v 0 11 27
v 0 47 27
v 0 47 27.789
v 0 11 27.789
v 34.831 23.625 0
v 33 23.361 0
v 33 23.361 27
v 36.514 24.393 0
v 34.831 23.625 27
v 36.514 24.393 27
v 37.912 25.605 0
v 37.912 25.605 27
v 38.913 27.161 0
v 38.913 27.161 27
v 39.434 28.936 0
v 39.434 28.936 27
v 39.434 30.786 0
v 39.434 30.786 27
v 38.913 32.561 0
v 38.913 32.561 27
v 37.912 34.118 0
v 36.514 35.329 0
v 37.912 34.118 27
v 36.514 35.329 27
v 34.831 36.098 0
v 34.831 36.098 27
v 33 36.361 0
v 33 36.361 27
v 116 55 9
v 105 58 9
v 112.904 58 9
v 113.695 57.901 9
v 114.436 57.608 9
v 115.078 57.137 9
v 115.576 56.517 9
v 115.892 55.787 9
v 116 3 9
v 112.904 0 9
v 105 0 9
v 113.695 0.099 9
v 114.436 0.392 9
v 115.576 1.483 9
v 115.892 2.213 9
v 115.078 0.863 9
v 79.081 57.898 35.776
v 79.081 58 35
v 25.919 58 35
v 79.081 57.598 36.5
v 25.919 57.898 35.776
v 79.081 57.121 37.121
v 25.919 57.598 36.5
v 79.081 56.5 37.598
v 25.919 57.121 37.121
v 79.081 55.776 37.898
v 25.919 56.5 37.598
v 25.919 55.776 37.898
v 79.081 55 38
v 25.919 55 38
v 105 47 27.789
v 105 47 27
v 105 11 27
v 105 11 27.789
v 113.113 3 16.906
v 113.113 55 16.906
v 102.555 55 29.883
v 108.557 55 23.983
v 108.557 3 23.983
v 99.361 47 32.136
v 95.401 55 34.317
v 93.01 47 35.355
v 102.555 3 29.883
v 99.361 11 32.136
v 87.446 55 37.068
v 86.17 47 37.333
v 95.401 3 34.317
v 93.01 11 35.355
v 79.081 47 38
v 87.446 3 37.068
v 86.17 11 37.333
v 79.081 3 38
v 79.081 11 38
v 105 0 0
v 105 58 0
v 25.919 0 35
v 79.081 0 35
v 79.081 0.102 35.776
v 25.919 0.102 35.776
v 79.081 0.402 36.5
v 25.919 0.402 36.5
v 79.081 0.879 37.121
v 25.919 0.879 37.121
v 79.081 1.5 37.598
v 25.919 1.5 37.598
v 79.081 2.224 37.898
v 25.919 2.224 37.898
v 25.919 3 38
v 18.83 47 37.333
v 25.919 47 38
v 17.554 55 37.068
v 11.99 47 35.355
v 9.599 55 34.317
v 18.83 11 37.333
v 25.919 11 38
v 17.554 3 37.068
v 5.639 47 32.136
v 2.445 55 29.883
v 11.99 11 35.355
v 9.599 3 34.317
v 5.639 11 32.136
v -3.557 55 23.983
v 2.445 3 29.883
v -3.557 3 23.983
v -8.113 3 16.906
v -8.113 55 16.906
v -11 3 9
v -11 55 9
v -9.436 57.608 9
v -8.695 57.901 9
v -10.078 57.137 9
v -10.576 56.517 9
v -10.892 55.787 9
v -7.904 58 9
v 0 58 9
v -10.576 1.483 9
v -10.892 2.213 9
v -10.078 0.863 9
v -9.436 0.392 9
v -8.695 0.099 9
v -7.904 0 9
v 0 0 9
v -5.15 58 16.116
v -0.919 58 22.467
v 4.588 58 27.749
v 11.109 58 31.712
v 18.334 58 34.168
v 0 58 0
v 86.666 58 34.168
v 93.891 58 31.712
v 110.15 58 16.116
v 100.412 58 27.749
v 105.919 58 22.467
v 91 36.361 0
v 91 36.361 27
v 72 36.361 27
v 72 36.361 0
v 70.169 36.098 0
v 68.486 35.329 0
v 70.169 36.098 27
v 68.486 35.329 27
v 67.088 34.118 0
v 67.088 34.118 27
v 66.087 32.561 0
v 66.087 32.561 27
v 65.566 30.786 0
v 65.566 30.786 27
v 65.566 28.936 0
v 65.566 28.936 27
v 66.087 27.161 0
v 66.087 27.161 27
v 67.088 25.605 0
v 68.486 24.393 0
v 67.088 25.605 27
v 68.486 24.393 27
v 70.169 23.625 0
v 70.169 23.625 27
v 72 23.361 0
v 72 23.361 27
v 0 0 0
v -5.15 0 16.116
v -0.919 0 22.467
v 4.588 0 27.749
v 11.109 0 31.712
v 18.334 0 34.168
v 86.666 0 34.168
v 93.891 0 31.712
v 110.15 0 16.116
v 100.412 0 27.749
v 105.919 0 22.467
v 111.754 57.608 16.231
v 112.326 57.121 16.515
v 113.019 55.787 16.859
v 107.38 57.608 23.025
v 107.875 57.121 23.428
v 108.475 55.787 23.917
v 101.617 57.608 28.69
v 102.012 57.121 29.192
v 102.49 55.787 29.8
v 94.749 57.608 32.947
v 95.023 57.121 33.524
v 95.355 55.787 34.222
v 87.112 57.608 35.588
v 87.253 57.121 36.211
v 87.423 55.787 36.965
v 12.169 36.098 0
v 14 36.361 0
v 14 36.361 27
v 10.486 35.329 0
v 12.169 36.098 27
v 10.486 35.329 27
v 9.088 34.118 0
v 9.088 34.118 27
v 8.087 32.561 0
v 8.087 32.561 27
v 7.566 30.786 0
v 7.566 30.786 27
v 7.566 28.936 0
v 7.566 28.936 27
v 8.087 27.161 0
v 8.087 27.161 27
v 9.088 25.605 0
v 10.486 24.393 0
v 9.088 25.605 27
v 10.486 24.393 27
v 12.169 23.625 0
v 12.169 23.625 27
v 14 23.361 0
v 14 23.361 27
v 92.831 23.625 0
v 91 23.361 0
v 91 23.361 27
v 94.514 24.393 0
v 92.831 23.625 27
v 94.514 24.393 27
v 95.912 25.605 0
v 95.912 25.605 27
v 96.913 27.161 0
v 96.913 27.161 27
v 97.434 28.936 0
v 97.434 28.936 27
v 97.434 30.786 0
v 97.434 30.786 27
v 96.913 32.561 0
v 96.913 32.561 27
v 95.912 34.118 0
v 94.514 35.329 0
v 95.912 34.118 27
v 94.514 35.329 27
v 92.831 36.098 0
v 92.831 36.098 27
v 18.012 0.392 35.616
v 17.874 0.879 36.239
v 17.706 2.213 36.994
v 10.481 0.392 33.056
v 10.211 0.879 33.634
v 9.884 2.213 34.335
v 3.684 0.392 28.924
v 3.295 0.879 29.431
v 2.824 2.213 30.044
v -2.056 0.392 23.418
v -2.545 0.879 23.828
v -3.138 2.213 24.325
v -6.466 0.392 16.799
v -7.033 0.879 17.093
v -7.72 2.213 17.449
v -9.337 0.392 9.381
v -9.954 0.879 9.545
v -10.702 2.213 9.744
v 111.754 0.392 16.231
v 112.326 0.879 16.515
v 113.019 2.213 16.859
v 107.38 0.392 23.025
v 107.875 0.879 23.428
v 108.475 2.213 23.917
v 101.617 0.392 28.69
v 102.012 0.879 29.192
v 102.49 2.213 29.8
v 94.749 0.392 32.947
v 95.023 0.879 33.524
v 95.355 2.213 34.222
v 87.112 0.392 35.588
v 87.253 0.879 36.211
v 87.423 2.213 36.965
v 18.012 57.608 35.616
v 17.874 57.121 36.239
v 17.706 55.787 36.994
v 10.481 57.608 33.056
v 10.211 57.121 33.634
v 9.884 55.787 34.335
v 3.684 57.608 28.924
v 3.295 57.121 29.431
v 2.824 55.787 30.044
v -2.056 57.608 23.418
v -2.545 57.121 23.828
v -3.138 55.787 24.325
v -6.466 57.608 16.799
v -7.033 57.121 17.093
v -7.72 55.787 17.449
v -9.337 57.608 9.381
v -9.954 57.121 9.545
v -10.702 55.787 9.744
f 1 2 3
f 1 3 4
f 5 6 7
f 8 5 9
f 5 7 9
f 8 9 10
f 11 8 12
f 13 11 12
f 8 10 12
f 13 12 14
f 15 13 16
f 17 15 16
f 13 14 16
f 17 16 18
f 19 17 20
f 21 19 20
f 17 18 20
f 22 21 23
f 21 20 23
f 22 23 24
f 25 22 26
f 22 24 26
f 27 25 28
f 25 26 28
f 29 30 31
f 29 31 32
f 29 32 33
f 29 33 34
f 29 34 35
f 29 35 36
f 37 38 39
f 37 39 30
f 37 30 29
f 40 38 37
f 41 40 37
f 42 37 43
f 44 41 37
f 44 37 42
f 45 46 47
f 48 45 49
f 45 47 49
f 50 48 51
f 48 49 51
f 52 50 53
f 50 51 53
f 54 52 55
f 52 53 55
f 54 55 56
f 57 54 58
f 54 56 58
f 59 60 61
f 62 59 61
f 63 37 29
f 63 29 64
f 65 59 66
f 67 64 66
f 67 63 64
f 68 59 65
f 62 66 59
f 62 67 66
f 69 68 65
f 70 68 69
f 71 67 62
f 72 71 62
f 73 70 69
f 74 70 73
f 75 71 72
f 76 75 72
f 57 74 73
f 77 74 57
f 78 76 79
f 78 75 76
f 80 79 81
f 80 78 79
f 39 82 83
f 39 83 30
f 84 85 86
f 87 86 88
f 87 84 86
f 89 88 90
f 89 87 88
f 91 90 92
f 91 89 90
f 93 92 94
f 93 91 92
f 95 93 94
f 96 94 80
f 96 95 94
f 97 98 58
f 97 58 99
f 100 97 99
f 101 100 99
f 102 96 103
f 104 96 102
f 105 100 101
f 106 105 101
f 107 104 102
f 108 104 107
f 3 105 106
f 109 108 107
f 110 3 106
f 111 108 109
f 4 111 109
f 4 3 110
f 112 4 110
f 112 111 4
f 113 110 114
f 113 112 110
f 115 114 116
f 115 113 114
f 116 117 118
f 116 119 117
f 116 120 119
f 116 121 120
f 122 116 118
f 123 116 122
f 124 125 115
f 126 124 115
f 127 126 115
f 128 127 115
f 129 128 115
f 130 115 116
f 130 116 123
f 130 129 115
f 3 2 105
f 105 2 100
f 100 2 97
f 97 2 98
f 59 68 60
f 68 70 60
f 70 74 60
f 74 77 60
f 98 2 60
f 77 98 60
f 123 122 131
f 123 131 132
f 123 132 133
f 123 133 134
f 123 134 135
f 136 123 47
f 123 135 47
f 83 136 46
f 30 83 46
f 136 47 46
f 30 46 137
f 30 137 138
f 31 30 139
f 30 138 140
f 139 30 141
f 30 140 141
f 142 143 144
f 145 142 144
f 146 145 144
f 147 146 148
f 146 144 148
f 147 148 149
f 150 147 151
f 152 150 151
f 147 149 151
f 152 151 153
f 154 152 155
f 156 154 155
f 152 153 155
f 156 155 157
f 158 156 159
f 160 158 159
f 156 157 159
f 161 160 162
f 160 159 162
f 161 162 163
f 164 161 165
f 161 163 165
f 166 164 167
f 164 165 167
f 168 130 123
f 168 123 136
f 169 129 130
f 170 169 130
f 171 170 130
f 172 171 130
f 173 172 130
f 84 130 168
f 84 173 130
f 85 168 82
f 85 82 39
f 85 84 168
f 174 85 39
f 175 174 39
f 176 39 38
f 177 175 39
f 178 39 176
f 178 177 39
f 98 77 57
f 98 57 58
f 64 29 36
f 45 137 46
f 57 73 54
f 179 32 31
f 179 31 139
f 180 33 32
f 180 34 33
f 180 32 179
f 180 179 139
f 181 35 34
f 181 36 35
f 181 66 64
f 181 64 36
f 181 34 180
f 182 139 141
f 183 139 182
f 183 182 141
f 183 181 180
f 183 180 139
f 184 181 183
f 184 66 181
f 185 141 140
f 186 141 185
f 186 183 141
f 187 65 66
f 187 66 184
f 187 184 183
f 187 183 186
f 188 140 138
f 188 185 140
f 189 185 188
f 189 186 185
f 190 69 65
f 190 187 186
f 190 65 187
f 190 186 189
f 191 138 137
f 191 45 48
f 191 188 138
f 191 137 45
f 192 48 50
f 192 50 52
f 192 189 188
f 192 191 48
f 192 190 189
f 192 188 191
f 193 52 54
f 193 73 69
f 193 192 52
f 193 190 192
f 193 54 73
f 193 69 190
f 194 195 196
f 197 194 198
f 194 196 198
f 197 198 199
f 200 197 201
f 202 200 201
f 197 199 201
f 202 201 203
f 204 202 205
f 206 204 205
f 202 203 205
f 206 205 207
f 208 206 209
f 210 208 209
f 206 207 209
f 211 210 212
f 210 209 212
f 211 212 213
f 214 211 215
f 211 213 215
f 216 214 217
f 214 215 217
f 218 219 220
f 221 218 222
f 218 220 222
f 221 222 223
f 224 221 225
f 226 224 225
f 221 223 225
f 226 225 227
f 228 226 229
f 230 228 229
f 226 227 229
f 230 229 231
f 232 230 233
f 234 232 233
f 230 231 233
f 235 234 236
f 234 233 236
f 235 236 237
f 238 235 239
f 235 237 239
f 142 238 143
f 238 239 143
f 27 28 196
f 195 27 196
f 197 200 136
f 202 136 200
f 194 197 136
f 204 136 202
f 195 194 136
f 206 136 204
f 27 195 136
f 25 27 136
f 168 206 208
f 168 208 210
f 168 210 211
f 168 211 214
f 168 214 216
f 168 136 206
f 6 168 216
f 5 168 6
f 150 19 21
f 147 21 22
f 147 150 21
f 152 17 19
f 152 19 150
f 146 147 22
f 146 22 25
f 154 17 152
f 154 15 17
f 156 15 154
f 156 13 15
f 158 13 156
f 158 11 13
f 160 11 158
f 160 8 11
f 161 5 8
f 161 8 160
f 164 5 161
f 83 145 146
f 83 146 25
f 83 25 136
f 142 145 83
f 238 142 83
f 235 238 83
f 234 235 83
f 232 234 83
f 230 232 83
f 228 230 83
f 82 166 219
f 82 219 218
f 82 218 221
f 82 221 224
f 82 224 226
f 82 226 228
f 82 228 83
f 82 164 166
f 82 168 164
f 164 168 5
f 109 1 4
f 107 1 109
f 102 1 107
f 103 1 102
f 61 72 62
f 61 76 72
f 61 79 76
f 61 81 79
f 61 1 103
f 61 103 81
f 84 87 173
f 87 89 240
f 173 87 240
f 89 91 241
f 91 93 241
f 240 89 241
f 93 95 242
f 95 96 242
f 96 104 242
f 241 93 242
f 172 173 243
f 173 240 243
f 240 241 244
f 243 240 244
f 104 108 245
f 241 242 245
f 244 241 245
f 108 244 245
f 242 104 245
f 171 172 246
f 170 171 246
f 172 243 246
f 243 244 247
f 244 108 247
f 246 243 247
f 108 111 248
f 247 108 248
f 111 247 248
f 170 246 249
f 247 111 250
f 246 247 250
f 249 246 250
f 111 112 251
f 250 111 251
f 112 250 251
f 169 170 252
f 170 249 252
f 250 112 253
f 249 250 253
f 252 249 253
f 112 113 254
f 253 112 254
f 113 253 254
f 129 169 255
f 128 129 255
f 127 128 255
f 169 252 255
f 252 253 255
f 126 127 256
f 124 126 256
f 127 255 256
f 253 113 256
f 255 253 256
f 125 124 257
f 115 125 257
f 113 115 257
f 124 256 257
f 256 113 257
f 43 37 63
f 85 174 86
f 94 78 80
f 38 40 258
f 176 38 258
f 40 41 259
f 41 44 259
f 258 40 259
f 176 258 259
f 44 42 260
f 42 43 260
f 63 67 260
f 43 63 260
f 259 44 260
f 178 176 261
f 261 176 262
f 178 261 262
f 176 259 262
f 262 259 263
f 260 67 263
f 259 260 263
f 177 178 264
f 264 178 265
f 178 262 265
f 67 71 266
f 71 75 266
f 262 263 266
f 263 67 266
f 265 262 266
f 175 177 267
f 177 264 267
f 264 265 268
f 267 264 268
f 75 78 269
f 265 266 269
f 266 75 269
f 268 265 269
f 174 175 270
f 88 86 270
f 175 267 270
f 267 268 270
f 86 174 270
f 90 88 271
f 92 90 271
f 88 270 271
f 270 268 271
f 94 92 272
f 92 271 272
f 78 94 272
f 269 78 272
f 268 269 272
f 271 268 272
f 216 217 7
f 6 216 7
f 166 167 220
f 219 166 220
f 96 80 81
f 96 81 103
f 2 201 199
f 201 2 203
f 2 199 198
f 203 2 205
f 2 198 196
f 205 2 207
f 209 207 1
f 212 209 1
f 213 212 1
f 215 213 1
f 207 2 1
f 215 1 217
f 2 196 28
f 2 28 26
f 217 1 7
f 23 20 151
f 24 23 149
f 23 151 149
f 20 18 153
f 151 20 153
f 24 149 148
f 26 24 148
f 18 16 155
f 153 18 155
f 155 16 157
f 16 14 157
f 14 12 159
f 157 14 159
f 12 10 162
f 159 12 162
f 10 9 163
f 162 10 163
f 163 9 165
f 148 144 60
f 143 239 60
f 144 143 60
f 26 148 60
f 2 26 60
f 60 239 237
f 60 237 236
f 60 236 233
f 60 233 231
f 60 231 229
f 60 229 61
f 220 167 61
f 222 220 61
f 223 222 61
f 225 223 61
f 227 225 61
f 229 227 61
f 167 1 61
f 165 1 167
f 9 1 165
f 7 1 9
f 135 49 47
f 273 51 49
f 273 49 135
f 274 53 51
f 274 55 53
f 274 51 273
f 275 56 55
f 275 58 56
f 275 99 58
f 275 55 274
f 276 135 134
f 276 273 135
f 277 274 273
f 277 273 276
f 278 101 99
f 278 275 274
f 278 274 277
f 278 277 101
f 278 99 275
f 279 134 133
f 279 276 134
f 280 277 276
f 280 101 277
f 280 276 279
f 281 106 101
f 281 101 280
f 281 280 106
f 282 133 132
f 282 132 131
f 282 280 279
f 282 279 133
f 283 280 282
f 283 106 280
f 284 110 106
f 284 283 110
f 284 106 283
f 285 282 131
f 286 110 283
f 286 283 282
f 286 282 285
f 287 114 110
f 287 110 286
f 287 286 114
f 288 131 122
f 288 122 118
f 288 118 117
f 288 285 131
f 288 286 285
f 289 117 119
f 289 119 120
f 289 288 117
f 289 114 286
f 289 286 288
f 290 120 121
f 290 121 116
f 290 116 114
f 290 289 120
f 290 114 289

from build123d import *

# Parameters (mm, degrees)
F1_DEPTH = 58
F3_START = -27
F2_W     = 105
F2_H     = 36
F3_DEPTH = 11
F4_R     = 3
F5_R     = 3
F7_DEPTH = 50


with BuildPart() as f1:
    # F0 (on Front) → F1 (new body)
    with BuildSketch(Plane.XZ):
        with BuildLine():
            Line((0, 9), (0, 0))
            Line((0, 0), (105, 0))
            Line((105, 0), (105, 9))
            Line((105, 9), (116, 9))
            ThreePointArc((116, 9), (102.5545593047, 29.883105595), (79.0811701161, 38))
            Line((79.0811701161, 38), (25.9188298839, 38))
            ThreePointArc((25.9188298839, 38), (2.4454406953, 29.883105595), (-11, 9))
            Line((-11, 9), (0, 9))
        make_face()
    extrude(amount=-F1_DEPTH)

    # F2 (on face) → F3 (cut)
    with BuildSketch(Plane(origin=(0, 0, 0), x_dir=(1, 0, 0), z_dir=(0, 0, -1)).offset(F3_START)):
        with Locations((52.5, -29)):
            Rectangle(F2_W, F2_H)
    extrude(amount=-F3_DEPTH, mode=Mode.SUBTRACT)

    # F4
    f4_edges = [f1.edges().sort_by_distance(p)[0] for p in [
        (102.554559, 58, 29.883106),
        (52.5, 58, 38),
        (2.445441, 58, 29.883106),
    ]]
    fillet(f4_edges, radius=F4_R)

    # F5
    f5_edges = [f1.edges().sort_by_distance(p)[0] for p in [
        (52.5, 0, 38),
        (2.445441, 0, 29.883106),
        (102.554559, 0, 29.883106),
    ]]
    fillet(f5_edges, radius=F5_R)

    # F6 (on face) → F7 (cut)
    with BuildSketch(Plane.XY.offset(27)):
        with BuildLine():
            Line((72, 23.3612143666), (91, 23.3612143666))
            ThreePointArc((91, 23.3612143666), (97.5, 29.8612143666), (91, 36.3612143666))
            Line((91, 36.3612143666), (72, 36.3612143666))
            ThreePointArc((72, 36.3612143666), (65.5, 29.8612143666), (72, 23.3612143666))
        make_face()
        with BuildLine():
            Line((33, 36.3612149123), (14, 36.3612149123))
            ThreePointArc((14, 36.3612149123), (7.5, 29.8612149123), (14, 23.3612149123))
            Line((14, 23.3612149123), (33, 23.3612149123))
            ThreePointArc((33, 23.3612149123), (39.5, 29.8612149123), (33, 36.3612149123))
        make_face()
    extrude(amount=-F7_DEPTH, mode=Mode.SUBTRACT)


solid = f1.part
